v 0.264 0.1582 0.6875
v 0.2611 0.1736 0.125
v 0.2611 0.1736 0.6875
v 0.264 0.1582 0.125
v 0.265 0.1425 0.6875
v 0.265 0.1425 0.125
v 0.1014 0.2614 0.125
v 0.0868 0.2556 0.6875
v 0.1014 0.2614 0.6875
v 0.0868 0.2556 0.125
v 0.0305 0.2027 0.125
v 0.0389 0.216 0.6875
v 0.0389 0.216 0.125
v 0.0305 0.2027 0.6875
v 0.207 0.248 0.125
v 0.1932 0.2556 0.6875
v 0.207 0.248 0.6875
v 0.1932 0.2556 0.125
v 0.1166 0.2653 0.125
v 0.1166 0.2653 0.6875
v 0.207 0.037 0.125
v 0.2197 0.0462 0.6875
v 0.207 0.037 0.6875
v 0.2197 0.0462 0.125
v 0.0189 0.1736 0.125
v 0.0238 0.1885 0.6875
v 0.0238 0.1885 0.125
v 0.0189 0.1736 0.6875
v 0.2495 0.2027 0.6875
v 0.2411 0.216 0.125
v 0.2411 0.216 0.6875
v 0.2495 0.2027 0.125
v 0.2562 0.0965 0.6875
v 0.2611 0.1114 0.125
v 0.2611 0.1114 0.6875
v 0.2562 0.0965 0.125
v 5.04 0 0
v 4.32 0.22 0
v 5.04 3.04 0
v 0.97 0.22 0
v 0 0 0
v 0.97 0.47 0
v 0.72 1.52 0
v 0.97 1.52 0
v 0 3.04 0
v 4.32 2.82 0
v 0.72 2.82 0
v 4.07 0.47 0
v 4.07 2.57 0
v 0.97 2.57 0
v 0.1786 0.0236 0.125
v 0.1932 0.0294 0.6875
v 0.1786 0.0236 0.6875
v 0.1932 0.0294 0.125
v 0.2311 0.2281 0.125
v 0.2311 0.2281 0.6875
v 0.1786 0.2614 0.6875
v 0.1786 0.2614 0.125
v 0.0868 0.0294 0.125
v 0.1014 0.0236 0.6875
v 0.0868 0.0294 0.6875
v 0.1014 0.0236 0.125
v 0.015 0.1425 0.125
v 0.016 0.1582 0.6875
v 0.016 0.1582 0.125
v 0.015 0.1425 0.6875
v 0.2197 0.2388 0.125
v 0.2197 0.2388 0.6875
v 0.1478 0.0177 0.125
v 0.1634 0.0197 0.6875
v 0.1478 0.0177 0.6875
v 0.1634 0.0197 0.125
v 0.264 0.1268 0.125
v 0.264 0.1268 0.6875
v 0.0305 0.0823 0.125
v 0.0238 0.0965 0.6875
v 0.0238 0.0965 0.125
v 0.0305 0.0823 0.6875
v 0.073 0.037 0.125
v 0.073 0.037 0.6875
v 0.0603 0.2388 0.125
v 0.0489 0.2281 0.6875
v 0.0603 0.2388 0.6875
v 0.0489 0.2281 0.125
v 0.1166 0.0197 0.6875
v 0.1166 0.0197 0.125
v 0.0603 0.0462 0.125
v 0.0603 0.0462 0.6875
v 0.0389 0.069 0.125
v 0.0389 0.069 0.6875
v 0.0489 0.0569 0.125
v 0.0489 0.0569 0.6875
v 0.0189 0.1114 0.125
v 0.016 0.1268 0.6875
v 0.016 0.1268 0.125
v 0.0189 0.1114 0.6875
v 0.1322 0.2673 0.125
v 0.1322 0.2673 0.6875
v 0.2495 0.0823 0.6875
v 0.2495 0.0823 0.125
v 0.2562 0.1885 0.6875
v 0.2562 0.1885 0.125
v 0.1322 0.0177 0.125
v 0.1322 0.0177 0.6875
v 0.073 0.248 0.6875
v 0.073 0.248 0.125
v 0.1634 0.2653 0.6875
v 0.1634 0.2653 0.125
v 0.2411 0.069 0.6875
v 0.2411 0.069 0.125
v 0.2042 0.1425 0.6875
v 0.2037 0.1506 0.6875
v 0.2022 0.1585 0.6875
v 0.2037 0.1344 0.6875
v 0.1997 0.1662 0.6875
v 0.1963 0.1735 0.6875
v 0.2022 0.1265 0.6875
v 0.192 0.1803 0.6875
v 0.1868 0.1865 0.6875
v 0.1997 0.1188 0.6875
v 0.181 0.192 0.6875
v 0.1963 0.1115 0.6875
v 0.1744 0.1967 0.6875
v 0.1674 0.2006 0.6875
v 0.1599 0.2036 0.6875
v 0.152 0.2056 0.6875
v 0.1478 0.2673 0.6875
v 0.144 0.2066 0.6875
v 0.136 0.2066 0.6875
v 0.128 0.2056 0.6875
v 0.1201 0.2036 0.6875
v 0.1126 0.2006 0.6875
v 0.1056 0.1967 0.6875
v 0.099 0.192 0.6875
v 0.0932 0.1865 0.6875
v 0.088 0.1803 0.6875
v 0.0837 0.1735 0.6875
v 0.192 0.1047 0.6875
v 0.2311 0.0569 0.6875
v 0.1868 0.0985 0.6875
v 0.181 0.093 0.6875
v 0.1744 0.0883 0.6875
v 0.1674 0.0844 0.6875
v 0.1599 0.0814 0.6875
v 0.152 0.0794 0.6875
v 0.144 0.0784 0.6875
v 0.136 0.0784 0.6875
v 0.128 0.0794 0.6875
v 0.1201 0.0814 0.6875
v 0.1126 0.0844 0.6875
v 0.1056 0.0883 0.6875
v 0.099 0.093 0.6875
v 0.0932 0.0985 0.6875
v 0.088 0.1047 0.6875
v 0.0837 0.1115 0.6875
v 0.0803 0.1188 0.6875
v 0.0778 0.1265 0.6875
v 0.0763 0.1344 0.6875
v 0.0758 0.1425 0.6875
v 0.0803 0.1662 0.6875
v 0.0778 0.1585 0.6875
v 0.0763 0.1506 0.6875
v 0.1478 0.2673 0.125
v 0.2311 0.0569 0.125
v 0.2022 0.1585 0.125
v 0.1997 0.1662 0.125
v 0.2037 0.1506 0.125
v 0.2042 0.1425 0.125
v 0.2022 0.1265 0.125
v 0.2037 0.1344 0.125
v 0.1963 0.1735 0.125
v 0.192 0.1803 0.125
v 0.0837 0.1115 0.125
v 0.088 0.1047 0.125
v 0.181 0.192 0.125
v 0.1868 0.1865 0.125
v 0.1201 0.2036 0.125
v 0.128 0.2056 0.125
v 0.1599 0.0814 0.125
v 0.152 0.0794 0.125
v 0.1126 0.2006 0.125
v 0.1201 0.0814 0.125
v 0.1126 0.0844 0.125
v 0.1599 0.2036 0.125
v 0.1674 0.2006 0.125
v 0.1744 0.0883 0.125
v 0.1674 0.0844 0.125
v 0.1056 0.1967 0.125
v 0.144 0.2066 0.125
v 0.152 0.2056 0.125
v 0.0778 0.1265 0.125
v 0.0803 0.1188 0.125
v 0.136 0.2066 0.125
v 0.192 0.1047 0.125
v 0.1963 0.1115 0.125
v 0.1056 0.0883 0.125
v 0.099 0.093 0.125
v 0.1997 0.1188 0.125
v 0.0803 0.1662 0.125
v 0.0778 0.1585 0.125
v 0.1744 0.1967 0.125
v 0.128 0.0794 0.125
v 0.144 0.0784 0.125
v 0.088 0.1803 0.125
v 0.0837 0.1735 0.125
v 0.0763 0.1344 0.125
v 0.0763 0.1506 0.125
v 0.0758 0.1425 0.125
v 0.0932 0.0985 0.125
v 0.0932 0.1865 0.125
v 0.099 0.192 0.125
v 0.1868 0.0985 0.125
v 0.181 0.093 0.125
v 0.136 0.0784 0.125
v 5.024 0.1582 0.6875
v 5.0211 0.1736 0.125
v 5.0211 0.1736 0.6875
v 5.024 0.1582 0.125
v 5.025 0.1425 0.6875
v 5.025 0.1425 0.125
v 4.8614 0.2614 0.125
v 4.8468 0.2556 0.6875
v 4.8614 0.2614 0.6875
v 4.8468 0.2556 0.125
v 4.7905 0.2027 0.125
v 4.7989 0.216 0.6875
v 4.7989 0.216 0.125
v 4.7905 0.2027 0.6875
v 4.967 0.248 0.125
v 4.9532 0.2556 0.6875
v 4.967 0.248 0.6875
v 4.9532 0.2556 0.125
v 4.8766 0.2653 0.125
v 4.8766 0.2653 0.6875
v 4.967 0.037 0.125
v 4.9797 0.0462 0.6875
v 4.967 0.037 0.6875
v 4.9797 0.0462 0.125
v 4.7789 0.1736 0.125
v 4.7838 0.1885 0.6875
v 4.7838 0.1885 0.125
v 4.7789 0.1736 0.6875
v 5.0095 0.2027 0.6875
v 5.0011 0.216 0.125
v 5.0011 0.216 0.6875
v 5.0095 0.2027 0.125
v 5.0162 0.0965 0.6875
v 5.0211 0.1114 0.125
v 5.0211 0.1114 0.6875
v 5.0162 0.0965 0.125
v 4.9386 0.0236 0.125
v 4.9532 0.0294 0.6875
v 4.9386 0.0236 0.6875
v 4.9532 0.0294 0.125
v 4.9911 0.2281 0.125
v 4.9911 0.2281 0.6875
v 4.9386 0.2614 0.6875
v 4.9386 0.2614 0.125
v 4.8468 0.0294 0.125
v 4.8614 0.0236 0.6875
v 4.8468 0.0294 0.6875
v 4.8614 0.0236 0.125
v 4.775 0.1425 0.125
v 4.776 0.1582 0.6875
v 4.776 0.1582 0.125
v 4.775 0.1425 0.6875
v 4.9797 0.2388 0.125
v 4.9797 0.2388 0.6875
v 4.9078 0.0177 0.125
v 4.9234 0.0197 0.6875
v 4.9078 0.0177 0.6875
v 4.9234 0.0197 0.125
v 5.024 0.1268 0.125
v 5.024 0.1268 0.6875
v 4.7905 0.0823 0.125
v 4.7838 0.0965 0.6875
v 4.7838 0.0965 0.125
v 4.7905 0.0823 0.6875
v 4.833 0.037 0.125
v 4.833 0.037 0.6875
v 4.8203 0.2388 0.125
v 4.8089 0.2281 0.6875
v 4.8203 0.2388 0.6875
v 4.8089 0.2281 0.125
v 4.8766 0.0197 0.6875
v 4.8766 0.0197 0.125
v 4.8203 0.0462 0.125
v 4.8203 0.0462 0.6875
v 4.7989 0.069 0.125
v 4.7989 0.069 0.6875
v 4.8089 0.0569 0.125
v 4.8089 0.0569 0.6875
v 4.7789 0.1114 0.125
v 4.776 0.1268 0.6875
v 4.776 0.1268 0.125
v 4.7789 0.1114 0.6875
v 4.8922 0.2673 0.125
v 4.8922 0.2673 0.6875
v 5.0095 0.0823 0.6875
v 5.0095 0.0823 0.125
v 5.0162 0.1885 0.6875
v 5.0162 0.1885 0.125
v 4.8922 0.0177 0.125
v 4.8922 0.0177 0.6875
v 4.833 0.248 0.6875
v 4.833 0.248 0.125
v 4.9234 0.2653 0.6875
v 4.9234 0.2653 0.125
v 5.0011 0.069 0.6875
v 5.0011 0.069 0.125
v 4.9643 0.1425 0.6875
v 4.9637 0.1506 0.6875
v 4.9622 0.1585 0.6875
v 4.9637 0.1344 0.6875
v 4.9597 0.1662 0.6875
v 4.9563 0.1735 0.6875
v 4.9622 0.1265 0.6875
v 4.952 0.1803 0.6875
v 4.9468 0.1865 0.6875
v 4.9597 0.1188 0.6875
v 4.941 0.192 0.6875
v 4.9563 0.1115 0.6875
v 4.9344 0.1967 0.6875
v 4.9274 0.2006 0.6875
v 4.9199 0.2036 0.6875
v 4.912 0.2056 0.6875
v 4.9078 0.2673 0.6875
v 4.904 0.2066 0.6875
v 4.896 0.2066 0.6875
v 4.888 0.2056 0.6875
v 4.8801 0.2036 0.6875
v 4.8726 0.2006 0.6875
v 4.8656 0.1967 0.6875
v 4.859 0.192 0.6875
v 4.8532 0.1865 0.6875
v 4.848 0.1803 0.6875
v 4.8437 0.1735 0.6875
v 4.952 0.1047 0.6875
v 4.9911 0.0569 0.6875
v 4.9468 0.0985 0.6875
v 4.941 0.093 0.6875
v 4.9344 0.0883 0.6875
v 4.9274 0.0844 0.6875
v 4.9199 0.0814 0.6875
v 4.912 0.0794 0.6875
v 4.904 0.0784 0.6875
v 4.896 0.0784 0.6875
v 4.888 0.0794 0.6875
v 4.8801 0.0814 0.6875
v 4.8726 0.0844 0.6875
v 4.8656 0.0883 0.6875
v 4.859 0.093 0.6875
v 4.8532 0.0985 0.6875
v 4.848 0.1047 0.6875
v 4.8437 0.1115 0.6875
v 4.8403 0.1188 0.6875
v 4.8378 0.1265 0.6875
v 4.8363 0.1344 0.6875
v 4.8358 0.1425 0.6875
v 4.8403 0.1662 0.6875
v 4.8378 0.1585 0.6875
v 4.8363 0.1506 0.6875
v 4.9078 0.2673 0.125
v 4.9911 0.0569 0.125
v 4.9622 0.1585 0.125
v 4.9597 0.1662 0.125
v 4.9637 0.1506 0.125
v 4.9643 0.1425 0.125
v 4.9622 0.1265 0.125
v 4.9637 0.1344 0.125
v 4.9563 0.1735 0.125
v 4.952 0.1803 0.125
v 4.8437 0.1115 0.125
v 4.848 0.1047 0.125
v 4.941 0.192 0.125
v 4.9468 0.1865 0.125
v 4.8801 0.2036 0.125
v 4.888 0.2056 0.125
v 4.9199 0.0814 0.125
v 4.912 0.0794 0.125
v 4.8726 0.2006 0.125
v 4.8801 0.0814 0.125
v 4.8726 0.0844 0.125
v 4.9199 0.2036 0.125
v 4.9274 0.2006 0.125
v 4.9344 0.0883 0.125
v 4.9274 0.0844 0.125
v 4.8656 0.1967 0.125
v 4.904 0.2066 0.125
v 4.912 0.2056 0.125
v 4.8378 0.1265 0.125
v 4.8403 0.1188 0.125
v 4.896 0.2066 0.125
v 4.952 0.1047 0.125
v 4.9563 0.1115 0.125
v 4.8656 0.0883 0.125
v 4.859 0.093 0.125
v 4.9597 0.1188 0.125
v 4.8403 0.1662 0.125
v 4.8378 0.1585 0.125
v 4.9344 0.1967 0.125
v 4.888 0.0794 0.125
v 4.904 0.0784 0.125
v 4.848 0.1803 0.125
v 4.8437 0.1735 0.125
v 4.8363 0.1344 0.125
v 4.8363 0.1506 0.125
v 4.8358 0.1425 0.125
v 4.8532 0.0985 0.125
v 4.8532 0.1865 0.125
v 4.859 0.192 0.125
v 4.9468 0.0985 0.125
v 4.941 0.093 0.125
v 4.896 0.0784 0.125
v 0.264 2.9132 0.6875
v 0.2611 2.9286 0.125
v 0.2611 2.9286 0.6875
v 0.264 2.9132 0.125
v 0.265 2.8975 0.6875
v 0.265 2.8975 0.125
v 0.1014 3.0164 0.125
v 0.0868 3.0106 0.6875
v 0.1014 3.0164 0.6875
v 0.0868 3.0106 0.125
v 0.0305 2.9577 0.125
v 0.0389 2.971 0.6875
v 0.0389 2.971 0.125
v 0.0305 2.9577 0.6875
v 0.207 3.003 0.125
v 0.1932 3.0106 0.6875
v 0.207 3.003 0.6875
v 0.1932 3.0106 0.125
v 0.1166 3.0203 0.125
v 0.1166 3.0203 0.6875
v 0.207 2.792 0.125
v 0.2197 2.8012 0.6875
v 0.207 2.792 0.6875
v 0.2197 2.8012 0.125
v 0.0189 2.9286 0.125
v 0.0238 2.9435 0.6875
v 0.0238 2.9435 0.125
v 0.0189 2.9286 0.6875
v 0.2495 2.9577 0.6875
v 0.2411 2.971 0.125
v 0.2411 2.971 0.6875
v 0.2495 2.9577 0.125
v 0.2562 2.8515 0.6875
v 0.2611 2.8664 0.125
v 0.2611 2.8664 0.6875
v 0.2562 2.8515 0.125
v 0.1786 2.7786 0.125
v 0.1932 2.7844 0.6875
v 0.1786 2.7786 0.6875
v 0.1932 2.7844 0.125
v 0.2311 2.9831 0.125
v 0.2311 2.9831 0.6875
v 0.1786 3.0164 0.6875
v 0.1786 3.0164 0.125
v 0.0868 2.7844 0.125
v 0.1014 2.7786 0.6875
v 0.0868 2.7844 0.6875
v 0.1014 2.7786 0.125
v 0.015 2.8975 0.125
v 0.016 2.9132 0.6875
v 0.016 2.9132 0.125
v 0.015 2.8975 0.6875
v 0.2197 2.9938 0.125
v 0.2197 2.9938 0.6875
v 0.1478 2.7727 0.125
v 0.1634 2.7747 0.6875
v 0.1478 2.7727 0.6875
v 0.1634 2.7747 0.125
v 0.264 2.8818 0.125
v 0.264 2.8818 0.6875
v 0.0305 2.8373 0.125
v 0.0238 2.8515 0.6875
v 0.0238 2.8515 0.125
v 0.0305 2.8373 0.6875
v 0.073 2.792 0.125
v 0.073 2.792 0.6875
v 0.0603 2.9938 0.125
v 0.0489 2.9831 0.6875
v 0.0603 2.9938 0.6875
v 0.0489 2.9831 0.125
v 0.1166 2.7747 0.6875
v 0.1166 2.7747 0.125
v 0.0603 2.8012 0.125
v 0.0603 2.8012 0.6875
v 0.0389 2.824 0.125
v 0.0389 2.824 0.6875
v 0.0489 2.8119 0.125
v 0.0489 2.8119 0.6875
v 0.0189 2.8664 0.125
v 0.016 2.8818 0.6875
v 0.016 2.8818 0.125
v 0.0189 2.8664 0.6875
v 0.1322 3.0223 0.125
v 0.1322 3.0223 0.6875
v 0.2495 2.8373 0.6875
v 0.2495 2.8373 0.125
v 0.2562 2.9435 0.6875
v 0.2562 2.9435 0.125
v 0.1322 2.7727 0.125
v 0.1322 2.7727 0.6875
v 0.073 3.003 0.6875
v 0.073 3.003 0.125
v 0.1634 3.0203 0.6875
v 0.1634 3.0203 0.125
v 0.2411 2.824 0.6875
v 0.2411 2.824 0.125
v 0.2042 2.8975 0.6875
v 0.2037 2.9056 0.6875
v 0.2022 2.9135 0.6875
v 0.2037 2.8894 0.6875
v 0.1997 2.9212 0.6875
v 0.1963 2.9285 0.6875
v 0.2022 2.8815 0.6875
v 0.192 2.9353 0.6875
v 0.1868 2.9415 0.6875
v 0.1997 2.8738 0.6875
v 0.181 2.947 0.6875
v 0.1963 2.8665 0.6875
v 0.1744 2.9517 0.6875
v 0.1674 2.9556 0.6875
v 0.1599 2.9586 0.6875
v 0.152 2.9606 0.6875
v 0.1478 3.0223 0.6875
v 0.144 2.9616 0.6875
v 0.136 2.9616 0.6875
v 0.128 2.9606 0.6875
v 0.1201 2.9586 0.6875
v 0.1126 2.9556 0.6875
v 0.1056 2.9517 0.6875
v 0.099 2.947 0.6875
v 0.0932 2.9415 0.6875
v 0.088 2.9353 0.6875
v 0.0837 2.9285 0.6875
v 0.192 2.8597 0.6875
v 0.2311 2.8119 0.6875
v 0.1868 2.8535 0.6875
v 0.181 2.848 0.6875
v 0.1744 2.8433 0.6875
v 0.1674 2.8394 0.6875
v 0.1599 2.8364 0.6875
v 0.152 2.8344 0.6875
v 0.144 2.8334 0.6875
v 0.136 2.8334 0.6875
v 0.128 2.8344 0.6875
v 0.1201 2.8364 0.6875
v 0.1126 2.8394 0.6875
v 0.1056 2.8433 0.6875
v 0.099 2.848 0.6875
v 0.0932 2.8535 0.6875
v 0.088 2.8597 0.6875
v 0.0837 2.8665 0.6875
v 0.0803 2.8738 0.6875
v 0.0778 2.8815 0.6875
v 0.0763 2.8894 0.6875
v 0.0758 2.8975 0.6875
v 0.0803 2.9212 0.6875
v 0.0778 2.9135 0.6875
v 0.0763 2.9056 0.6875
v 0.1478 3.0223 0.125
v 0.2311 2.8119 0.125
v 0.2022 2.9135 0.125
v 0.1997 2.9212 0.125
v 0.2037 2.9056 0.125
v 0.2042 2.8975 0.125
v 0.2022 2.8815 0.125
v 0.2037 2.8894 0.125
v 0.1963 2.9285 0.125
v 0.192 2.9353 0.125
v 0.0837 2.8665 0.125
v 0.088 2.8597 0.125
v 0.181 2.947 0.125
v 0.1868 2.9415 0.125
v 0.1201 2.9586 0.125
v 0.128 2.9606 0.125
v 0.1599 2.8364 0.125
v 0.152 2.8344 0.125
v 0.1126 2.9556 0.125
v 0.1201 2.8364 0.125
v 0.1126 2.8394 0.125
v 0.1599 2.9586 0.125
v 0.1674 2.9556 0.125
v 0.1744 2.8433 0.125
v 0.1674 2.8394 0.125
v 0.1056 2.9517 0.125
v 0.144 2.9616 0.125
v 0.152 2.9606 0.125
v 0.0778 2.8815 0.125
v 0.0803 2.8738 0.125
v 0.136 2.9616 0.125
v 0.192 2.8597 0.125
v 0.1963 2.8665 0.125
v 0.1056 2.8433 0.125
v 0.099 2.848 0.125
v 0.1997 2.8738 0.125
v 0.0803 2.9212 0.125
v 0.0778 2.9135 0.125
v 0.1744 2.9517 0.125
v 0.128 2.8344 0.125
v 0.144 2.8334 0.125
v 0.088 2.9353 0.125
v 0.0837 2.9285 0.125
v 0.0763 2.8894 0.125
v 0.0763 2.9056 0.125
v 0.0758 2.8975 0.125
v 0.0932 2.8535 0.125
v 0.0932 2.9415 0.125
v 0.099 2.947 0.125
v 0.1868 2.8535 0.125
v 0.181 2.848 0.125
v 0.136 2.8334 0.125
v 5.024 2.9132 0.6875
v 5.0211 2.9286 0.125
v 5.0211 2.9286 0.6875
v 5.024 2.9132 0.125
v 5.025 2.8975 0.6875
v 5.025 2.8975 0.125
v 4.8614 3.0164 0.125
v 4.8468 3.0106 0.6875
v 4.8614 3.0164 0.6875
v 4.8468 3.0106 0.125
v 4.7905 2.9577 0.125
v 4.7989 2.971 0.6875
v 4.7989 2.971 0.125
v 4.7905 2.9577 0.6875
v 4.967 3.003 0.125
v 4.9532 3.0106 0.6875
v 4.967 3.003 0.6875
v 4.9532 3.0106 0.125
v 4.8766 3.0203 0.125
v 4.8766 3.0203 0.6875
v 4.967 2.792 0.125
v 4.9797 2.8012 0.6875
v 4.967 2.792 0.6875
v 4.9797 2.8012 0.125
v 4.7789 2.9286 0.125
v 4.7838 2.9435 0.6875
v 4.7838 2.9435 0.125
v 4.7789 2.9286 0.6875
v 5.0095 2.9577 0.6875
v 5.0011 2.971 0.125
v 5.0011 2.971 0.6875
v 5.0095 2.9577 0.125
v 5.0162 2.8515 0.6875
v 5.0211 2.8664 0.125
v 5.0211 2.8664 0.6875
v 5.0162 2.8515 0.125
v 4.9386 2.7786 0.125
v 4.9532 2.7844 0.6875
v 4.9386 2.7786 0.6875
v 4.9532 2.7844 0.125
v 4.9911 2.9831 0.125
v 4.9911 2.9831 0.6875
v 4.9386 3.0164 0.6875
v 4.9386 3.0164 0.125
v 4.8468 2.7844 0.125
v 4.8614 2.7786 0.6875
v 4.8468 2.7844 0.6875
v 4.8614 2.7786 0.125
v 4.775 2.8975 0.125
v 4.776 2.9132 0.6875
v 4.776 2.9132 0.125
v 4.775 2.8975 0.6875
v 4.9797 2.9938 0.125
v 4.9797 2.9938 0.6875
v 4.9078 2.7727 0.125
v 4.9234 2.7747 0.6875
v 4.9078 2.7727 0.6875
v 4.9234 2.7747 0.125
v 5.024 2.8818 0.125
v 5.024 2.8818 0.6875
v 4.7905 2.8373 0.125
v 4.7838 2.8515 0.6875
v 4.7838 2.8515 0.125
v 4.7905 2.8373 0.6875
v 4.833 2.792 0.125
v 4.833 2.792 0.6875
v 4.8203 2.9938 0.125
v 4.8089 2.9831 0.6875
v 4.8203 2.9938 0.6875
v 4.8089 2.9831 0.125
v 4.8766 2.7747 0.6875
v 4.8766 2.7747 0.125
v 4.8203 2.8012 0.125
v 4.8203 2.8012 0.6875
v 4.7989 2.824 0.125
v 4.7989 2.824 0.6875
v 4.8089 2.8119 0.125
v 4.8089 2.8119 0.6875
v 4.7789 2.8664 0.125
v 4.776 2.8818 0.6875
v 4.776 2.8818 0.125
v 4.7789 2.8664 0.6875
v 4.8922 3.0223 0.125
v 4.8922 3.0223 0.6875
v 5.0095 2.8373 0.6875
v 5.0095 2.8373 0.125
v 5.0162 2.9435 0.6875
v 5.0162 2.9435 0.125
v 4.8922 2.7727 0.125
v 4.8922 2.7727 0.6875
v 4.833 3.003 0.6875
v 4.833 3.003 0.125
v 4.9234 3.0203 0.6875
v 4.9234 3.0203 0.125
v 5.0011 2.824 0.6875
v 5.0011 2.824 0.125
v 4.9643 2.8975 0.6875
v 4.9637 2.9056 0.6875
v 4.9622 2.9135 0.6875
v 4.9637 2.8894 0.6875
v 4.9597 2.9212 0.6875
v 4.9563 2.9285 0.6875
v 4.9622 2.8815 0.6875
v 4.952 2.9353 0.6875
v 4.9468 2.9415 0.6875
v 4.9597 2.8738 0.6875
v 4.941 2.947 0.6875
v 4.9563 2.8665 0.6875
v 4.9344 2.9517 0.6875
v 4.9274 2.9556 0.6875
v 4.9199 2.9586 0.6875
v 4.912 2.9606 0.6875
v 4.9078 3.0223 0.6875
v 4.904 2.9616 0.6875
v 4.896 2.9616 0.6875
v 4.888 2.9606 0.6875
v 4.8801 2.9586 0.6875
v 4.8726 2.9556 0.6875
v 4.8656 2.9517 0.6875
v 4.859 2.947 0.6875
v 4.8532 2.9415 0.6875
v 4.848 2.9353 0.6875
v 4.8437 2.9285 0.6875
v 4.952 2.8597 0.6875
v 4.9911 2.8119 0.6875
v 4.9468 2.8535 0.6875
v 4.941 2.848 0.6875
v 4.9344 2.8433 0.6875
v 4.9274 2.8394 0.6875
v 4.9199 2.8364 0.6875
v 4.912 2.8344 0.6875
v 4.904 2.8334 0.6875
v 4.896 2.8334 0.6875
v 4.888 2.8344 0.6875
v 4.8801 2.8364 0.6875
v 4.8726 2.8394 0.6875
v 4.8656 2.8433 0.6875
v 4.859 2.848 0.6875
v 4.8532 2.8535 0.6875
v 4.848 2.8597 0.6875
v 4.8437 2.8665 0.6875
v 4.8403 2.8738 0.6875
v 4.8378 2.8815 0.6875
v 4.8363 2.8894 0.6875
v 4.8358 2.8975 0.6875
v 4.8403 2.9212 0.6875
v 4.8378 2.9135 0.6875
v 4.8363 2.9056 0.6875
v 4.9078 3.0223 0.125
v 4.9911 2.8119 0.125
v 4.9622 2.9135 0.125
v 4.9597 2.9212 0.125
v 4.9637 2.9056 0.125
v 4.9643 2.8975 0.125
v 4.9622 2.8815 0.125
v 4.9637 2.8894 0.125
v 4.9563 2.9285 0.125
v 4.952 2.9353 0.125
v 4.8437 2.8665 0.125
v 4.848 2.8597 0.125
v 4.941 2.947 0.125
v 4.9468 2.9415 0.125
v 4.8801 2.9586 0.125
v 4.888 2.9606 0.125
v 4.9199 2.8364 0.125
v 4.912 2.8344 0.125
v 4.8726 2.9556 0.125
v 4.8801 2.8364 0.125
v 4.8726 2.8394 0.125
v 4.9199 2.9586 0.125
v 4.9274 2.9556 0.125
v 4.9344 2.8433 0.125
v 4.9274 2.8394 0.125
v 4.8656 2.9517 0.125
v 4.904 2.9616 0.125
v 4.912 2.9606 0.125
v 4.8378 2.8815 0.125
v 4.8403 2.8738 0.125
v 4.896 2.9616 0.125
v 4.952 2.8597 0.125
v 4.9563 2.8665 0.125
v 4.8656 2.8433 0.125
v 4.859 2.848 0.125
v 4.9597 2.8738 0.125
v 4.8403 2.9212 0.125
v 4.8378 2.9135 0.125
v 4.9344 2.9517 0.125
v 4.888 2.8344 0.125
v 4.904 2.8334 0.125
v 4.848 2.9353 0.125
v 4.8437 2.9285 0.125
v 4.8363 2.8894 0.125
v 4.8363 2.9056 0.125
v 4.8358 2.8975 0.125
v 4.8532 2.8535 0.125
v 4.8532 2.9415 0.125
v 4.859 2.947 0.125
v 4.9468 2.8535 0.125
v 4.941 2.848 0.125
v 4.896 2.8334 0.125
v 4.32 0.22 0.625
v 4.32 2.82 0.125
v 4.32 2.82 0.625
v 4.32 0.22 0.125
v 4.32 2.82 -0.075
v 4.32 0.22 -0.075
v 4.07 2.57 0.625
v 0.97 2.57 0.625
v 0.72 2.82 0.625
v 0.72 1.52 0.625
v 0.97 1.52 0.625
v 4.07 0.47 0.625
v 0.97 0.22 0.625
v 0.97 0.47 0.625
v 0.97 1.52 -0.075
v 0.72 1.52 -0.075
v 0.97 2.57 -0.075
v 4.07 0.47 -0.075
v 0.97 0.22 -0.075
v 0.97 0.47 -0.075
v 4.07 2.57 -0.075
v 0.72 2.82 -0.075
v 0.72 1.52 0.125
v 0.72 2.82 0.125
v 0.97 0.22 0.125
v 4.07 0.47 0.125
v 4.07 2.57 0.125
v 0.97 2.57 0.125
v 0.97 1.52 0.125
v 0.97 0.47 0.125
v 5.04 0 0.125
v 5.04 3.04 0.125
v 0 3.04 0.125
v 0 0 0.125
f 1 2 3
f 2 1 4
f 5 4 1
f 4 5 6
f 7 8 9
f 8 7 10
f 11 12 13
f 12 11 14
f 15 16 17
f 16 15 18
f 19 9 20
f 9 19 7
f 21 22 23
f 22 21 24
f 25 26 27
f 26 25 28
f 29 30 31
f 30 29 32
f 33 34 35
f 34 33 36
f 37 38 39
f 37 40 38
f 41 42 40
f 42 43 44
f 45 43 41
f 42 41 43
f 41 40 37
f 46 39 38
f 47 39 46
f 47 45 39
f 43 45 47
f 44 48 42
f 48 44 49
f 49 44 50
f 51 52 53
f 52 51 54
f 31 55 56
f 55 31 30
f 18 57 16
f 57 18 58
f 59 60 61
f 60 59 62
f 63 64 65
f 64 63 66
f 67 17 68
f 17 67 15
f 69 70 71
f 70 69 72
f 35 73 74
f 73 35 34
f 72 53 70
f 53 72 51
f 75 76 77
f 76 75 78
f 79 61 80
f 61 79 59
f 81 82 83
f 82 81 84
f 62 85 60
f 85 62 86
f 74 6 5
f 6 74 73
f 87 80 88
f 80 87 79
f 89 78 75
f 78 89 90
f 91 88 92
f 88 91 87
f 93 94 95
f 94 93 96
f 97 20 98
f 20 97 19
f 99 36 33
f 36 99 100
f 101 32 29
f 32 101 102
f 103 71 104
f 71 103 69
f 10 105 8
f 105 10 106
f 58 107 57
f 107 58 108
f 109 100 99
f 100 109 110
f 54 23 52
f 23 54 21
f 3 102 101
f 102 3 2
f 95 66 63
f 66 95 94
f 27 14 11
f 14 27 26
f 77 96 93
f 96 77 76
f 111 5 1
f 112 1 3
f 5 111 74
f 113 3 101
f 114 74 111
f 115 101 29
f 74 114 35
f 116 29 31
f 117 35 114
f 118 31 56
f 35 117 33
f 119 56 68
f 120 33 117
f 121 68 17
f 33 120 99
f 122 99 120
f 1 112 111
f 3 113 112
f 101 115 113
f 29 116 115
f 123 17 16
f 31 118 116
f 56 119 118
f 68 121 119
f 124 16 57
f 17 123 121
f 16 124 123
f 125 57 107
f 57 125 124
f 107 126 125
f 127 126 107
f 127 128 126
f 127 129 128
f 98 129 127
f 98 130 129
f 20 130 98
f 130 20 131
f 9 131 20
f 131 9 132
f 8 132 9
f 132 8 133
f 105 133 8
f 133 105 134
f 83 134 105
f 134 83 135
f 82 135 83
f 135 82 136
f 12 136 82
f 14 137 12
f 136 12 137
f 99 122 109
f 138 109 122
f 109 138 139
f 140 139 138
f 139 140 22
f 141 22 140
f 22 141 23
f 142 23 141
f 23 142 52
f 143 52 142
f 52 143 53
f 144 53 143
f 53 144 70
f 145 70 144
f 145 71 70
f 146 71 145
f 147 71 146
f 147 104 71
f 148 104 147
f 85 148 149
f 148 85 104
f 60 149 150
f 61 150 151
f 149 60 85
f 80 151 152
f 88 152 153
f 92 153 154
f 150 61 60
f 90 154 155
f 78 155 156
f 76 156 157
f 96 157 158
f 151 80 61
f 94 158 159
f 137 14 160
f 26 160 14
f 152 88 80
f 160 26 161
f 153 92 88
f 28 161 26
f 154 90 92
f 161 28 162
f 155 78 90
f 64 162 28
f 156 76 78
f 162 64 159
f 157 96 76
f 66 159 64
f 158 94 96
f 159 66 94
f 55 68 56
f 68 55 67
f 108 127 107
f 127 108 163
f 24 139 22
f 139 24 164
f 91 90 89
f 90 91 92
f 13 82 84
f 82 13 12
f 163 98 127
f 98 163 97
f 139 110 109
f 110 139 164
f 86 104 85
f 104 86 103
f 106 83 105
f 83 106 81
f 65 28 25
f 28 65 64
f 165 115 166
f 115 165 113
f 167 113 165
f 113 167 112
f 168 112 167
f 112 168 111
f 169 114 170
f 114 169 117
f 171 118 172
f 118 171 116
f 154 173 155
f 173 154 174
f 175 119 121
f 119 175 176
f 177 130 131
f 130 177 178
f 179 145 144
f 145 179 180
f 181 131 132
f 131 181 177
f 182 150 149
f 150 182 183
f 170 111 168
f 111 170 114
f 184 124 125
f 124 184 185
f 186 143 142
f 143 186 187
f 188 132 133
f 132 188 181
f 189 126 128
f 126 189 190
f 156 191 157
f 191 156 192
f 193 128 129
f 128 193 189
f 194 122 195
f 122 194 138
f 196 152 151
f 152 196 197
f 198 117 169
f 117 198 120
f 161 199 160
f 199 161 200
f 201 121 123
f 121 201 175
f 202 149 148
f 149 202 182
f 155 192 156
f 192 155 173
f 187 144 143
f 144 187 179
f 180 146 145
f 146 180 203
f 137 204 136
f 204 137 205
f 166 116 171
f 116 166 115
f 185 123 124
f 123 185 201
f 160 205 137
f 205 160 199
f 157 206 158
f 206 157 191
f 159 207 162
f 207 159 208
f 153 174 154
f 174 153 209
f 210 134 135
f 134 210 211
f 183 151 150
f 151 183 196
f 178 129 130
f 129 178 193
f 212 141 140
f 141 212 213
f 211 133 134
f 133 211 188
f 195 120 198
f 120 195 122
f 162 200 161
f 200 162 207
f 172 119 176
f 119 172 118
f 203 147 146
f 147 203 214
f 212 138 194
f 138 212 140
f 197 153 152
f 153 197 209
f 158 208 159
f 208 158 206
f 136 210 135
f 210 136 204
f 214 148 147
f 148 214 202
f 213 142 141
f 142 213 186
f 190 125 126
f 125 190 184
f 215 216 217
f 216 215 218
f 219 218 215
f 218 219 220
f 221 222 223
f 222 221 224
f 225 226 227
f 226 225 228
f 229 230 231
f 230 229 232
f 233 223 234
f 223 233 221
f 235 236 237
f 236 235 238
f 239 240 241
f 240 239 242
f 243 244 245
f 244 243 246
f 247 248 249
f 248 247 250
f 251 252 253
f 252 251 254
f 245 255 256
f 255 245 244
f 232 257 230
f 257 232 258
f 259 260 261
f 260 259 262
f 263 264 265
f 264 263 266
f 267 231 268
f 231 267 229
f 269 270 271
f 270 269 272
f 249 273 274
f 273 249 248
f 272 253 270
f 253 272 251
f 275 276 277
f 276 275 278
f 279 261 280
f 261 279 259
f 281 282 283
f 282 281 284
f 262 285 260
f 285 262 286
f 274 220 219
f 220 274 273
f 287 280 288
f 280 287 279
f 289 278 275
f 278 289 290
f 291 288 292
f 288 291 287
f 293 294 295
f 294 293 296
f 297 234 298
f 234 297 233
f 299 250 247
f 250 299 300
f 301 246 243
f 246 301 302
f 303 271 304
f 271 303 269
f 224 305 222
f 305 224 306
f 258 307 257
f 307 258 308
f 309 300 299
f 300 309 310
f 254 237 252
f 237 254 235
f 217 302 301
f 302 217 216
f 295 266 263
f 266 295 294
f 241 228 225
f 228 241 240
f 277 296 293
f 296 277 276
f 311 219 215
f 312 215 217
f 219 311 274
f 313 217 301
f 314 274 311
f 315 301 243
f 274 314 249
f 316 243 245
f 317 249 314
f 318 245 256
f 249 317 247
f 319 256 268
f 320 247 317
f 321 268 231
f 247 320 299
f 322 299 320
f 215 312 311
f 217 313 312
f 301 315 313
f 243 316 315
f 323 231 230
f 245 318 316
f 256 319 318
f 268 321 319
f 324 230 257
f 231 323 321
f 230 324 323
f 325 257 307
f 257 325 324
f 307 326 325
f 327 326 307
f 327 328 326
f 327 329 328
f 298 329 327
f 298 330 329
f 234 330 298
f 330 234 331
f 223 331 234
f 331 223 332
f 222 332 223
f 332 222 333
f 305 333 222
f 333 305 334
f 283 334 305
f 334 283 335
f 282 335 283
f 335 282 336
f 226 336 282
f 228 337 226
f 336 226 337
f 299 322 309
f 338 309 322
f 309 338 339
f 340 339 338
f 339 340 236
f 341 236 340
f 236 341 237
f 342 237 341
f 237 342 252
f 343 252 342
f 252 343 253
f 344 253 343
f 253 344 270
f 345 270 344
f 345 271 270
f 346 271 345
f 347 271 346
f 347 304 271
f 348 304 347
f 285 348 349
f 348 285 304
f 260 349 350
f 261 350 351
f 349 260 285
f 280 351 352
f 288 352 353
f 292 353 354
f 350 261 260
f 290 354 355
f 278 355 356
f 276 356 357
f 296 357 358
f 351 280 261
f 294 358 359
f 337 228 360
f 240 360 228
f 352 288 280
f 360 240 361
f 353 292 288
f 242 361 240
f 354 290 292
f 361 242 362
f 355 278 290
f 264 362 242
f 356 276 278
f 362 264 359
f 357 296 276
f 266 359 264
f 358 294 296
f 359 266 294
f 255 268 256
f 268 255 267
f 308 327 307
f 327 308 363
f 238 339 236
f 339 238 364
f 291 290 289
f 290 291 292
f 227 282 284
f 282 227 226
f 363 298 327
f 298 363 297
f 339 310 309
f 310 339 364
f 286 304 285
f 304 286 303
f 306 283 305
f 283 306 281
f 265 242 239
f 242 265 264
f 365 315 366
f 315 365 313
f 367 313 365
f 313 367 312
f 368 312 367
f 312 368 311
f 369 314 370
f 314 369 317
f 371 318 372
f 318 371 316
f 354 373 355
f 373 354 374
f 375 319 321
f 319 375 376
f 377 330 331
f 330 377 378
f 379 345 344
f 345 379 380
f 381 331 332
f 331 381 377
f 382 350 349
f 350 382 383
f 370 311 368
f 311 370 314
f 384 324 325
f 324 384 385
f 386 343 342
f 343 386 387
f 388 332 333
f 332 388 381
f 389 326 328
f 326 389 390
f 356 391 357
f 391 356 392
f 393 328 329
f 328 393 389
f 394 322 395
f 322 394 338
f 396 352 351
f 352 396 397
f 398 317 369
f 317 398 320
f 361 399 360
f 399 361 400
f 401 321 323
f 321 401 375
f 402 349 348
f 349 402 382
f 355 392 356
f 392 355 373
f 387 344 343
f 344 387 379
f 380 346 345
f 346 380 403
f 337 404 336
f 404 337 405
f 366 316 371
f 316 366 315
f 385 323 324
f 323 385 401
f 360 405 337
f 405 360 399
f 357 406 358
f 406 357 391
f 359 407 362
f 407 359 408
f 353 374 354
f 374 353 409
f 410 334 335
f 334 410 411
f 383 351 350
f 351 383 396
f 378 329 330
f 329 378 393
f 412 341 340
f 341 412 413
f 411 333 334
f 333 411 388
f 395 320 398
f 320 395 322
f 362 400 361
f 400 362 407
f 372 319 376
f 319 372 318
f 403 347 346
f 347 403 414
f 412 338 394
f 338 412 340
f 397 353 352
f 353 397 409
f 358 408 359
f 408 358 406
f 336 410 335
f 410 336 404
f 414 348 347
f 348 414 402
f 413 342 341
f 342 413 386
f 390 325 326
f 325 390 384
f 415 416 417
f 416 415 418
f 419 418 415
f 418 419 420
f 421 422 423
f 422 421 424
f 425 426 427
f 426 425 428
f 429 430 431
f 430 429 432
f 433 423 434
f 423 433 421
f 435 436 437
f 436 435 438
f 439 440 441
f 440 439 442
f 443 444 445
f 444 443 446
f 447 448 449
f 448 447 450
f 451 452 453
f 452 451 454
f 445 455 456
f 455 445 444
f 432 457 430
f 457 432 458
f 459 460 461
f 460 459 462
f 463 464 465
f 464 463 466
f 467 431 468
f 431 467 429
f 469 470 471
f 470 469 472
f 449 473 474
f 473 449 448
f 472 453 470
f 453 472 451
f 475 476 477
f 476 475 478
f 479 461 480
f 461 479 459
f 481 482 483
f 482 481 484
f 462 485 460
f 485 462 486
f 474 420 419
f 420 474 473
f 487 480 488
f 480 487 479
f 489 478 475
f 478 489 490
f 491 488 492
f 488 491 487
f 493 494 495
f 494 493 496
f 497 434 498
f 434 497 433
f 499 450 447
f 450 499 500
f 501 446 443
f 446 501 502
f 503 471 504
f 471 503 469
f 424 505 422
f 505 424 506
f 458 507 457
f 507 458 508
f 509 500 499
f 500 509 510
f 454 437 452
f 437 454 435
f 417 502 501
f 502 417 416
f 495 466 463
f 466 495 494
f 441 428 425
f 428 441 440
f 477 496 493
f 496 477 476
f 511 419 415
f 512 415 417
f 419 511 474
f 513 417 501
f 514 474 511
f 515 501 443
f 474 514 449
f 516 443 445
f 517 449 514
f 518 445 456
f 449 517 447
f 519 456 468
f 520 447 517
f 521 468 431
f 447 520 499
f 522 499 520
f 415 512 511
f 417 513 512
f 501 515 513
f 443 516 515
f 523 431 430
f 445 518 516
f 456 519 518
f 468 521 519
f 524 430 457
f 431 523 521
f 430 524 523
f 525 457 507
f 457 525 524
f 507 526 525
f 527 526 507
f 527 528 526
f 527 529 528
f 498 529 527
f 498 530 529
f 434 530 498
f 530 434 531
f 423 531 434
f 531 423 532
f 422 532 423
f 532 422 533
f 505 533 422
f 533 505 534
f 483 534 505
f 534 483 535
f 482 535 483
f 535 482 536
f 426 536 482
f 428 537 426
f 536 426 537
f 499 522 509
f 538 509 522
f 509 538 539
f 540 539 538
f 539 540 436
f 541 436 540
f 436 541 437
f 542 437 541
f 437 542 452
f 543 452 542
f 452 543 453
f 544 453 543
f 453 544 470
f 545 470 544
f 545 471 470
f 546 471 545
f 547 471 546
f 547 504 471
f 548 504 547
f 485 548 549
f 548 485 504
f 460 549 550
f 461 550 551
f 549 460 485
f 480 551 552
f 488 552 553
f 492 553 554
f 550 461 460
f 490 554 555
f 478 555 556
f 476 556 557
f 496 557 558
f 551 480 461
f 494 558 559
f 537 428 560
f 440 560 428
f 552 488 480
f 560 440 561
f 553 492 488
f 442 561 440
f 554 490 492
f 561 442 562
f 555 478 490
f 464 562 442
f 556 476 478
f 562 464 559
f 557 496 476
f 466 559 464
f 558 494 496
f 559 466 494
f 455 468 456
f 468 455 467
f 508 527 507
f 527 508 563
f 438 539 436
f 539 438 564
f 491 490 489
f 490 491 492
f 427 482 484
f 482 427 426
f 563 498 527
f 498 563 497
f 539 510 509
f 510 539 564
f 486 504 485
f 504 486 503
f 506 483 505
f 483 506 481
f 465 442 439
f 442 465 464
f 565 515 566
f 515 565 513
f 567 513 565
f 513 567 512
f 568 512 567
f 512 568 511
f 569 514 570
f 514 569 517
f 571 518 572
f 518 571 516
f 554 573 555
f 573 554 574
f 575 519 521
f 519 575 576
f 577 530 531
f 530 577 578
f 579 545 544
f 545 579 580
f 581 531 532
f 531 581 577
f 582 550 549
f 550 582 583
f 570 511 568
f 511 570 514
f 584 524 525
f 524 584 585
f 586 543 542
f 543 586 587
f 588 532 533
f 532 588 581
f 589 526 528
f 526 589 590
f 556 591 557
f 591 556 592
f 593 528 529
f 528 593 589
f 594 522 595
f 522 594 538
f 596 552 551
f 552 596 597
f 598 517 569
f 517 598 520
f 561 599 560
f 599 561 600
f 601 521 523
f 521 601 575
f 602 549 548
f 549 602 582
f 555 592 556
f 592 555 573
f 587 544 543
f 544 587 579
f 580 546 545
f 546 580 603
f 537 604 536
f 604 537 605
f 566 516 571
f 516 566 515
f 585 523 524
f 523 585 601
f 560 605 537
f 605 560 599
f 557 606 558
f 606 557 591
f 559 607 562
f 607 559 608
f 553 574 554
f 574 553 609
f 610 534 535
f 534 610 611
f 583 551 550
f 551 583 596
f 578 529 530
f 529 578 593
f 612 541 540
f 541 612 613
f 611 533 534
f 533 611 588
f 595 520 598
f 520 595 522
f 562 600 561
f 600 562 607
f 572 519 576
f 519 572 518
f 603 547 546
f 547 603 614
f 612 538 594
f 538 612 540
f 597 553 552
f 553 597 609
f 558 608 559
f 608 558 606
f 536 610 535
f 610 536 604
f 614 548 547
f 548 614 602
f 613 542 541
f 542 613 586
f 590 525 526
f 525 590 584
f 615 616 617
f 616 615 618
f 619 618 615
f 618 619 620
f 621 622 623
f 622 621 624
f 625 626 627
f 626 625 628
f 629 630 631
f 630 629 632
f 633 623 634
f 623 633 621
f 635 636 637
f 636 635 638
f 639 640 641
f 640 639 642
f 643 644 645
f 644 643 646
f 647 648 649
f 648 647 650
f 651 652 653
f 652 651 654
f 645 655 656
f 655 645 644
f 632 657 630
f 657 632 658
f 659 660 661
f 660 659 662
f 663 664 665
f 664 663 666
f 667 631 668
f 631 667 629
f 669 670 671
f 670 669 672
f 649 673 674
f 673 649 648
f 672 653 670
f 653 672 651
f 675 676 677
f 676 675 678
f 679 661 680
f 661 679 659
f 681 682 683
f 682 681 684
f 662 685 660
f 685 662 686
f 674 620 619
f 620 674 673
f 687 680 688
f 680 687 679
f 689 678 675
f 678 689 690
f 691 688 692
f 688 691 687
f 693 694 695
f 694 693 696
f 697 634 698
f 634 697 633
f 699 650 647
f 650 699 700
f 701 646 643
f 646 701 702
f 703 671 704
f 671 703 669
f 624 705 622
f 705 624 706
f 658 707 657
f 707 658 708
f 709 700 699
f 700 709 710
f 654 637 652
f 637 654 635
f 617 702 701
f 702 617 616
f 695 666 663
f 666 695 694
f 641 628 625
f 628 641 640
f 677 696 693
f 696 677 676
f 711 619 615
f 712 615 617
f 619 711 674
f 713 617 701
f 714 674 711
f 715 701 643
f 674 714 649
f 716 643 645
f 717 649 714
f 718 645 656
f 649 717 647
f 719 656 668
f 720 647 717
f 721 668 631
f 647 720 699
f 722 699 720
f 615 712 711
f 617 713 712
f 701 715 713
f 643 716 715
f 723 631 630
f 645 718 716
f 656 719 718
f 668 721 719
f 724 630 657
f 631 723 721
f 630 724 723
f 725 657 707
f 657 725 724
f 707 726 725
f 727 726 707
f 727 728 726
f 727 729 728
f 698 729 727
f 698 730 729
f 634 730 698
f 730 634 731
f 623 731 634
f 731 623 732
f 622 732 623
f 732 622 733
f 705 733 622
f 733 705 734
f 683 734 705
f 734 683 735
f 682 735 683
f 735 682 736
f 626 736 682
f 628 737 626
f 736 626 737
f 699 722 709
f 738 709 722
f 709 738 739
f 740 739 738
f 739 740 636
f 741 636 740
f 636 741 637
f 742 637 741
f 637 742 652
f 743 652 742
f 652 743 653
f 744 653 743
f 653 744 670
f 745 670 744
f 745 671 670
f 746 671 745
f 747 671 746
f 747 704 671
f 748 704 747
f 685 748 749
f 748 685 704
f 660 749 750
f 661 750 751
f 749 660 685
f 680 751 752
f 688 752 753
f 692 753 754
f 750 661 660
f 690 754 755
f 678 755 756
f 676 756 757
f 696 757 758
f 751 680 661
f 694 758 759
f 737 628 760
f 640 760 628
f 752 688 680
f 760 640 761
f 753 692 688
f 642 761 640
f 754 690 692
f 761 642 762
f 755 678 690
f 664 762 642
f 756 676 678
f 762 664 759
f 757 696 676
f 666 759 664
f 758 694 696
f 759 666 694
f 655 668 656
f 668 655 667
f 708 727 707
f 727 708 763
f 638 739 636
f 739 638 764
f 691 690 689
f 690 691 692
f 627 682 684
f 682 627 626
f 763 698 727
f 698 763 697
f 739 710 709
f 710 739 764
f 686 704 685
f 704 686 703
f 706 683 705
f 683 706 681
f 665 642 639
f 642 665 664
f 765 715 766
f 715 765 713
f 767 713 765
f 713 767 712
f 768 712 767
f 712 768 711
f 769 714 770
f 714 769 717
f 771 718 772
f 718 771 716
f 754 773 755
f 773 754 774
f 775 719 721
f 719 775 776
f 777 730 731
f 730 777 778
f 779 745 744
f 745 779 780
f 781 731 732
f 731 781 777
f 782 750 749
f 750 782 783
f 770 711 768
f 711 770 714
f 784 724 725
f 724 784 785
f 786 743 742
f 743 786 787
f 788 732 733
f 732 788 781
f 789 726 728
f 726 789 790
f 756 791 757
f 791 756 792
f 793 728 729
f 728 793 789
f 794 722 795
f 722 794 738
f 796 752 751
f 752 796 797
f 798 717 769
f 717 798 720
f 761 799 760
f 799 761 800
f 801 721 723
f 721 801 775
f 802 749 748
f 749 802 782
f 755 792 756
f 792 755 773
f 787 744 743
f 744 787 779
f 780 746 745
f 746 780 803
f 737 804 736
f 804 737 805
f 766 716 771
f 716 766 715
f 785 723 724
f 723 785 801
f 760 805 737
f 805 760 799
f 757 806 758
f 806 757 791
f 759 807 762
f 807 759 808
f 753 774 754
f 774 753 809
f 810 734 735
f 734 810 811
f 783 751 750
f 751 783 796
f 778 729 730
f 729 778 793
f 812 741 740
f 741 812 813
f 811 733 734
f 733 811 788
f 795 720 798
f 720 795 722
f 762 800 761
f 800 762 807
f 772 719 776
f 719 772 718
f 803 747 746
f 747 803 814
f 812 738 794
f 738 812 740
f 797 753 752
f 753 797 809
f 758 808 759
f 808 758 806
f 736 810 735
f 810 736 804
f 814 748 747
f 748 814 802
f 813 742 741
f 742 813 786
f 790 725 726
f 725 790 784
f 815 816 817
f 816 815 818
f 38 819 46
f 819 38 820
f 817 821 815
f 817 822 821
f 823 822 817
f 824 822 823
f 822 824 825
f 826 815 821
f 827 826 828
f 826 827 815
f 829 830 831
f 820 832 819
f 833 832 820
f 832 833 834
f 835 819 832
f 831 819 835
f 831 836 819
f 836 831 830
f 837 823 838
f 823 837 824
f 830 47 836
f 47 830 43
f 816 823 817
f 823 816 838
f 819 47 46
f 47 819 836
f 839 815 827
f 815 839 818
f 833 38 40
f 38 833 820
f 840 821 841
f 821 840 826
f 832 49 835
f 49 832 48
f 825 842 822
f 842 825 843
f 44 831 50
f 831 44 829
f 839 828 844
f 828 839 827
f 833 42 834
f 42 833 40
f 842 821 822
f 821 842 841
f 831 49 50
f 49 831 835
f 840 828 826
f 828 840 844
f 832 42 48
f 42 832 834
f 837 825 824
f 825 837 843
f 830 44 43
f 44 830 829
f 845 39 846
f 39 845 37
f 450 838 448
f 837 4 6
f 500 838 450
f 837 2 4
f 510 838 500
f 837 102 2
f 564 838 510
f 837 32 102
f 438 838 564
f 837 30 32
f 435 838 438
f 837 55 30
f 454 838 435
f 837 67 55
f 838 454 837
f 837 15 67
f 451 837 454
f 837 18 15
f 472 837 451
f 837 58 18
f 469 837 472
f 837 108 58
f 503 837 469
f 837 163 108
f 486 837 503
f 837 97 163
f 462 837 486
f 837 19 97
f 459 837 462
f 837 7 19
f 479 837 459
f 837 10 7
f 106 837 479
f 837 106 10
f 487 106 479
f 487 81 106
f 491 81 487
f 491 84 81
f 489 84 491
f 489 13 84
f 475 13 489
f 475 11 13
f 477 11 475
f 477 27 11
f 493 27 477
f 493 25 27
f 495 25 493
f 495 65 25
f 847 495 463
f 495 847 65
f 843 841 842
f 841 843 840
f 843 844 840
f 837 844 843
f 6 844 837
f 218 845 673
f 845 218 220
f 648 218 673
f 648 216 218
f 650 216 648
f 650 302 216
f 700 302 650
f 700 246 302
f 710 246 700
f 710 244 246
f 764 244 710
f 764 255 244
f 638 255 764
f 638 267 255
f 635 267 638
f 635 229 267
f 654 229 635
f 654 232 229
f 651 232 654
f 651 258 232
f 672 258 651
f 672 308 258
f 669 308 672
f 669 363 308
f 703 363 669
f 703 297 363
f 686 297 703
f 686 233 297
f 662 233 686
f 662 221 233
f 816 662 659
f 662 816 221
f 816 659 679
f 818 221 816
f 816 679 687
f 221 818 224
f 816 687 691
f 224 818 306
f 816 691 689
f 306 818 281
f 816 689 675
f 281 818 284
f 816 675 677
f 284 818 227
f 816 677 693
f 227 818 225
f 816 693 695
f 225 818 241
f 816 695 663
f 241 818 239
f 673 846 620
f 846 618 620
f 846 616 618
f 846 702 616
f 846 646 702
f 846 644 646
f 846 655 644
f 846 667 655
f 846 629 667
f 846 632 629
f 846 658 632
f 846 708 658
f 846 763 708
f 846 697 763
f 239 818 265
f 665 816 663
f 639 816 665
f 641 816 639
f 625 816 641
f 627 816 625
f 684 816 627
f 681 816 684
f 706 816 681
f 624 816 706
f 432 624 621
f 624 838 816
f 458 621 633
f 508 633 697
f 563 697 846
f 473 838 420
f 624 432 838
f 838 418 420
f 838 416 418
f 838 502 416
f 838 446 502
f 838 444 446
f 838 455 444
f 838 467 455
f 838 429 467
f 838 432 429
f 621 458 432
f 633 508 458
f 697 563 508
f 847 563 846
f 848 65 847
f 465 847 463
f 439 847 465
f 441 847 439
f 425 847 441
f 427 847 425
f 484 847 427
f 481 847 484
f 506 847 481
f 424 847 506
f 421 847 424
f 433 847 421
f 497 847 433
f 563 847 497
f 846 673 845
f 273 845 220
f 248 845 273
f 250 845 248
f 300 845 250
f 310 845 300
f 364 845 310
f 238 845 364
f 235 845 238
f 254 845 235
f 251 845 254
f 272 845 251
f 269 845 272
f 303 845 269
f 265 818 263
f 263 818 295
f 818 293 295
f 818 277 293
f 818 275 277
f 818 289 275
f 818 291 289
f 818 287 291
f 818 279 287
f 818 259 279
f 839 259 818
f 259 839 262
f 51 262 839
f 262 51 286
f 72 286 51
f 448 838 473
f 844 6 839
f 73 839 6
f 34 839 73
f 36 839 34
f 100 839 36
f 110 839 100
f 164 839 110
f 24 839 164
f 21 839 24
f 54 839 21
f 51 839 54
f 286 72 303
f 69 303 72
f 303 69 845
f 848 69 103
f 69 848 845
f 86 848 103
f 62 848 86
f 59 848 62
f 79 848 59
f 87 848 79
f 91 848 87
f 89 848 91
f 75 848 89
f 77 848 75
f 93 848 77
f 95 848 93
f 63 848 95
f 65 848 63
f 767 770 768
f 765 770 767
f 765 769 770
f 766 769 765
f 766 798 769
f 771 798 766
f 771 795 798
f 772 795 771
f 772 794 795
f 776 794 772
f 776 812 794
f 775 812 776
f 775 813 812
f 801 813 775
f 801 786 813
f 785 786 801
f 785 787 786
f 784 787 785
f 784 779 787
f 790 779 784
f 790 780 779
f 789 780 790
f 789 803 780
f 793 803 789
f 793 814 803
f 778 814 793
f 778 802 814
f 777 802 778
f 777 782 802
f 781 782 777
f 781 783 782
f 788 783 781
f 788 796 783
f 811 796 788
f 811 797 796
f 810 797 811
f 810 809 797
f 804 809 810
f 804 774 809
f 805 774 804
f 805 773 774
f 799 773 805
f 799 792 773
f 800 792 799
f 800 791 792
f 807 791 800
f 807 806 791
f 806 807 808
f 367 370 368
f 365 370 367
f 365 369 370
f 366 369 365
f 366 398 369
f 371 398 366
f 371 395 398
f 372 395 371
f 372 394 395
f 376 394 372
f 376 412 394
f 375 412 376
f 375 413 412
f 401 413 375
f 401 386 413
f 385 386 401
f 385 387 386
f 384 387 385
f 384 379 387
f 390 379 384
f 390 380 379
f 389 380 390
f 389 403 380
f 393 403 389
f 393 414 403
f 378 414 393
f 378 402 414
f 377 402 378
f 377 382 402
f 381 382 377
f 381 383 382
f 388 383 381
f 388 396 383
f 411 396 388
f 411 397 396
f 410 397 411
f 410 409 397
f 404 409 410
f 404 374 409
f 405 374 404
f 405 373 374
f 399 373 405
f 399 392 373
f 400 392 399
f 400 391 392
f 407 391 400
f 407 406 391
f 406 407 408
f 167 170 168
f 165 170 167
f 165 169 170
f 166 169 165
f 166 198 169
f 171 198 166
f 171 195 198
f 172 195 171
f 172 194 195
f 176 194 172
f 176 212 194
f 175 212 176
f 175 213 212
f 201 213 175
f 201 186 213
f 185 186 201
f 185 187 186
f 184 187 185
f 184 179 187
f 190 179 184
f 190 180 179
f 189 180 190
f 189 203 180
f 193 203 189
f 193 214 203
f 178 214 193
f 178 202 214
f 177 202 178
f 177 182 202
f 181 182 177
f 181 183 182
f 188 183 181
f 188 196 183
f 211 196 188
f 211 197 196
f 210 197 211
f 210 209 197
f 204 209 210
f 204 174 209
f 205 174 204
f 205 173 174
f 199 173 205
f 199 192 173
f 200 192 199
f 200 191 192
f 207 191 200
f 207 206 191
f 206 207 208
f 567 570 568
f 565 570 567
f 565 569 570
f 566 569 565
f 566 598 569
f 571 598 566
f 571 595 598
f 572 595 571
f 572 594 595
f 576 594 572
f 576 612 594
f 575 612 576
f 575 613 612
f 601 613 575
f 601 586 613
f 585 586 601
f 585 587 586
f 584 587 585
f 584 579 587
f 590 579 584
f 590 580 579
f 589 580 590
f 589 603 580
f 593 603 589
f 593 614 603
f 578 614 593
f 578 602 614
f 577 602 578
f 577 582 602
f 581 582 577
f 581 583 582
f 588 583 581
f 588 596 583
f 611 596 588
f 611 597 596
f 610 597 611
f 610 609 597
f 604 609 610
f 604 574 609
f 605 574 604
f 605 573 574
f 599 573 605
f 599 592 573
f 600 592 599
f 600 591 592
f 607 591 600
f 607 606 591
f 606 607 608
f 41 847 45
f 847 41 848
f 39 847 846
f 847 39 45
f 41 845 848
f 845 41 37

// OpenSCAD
render = "sled";
//render = "batterycover";

$fn = 50;

// Dimensions from PT-11668 data sheet (https://www.budind.com/pdf/hb11630.pdf)
G = 3.040;
H = 5.040;
J = 4.760;
K = 2.755;

// Platform thickness
pthick = 0.125;

// Battery size
bwidth = 1.8;
blength = 2.8;
bheight = 0.3;

binsideWidth = bwidth + 0.3;
binsideLength = blength + 0.3;
binsideHeight = bheight + 0.3;
boutsideWidth = binsideWidth + 0.5;
boutsideLength = binsideLength + 0.5;
boutsideHeight = binsideHeight + 0.1;

if (render == "sled")
    sled();
else if (render == "batterycover")
    batteryCover();

module sled()
{
    union()
    {
        // Build the platform with the spacers. NB: the spacers will not be hollow
        // all the way through, because of the platform. They'll need to be drilled.
        cube([H, G, pthick]);
        translate([(H - J) / 2, (G - K) / 2, 0]) spacer(0.25, 0.1285, 11 / 16);
        translate([H - (H - J) / 2, (G - K) / 2, 0]) spacer(0.25, 0.1285, 11 / 16);
        translate([(H - J) / 2, G - (G - K) / 2, 0]) spacer(0.25, 0.1285, 11 / 16);
        translate([H - (H - J) / 2, G - (G - K) / 2, 0]) spacer(0.25, 0.1285, 11 / 16);
        
        // Build the battery holder
        translate([(H - boutsideLength) / 2 + boutsideLength / 2, 
                   (G - boutsideWidth) / 2 + boutsideWidth / 2, 
                   bheight / 2 + pthick])
        difference()
        {
            cube([boutsideLength, boutsideWidth, boutsideHeight], center = true);
            cube([binsideLength, binsideWidth, boutsideHeight], center = true);
            // Make a notch for the wires
            translate([-boutsideLength / 2, -boutsideWidth / 4, 0]) cube([boutsideWidth - binsideWidth, boutsideWidth / 2, boutsideHeight], center = true);
        }
    }
}

module spacer(outerDiameter, innerDiameter, height)
{
    difference()
    {
        cylinder(h = height, d = outerDiameter);
        cylinder(h = height, d = innerDiameter);
    }
}

module batteryCover()
{
    union()
    {
        cube([boutsideLength, boutsideWidth, pthick], center = true);
        translate([0, 0, pthick]) cube([blength, bwidth, boutsideHeight - binsideHeight], center = true);
    }
}
